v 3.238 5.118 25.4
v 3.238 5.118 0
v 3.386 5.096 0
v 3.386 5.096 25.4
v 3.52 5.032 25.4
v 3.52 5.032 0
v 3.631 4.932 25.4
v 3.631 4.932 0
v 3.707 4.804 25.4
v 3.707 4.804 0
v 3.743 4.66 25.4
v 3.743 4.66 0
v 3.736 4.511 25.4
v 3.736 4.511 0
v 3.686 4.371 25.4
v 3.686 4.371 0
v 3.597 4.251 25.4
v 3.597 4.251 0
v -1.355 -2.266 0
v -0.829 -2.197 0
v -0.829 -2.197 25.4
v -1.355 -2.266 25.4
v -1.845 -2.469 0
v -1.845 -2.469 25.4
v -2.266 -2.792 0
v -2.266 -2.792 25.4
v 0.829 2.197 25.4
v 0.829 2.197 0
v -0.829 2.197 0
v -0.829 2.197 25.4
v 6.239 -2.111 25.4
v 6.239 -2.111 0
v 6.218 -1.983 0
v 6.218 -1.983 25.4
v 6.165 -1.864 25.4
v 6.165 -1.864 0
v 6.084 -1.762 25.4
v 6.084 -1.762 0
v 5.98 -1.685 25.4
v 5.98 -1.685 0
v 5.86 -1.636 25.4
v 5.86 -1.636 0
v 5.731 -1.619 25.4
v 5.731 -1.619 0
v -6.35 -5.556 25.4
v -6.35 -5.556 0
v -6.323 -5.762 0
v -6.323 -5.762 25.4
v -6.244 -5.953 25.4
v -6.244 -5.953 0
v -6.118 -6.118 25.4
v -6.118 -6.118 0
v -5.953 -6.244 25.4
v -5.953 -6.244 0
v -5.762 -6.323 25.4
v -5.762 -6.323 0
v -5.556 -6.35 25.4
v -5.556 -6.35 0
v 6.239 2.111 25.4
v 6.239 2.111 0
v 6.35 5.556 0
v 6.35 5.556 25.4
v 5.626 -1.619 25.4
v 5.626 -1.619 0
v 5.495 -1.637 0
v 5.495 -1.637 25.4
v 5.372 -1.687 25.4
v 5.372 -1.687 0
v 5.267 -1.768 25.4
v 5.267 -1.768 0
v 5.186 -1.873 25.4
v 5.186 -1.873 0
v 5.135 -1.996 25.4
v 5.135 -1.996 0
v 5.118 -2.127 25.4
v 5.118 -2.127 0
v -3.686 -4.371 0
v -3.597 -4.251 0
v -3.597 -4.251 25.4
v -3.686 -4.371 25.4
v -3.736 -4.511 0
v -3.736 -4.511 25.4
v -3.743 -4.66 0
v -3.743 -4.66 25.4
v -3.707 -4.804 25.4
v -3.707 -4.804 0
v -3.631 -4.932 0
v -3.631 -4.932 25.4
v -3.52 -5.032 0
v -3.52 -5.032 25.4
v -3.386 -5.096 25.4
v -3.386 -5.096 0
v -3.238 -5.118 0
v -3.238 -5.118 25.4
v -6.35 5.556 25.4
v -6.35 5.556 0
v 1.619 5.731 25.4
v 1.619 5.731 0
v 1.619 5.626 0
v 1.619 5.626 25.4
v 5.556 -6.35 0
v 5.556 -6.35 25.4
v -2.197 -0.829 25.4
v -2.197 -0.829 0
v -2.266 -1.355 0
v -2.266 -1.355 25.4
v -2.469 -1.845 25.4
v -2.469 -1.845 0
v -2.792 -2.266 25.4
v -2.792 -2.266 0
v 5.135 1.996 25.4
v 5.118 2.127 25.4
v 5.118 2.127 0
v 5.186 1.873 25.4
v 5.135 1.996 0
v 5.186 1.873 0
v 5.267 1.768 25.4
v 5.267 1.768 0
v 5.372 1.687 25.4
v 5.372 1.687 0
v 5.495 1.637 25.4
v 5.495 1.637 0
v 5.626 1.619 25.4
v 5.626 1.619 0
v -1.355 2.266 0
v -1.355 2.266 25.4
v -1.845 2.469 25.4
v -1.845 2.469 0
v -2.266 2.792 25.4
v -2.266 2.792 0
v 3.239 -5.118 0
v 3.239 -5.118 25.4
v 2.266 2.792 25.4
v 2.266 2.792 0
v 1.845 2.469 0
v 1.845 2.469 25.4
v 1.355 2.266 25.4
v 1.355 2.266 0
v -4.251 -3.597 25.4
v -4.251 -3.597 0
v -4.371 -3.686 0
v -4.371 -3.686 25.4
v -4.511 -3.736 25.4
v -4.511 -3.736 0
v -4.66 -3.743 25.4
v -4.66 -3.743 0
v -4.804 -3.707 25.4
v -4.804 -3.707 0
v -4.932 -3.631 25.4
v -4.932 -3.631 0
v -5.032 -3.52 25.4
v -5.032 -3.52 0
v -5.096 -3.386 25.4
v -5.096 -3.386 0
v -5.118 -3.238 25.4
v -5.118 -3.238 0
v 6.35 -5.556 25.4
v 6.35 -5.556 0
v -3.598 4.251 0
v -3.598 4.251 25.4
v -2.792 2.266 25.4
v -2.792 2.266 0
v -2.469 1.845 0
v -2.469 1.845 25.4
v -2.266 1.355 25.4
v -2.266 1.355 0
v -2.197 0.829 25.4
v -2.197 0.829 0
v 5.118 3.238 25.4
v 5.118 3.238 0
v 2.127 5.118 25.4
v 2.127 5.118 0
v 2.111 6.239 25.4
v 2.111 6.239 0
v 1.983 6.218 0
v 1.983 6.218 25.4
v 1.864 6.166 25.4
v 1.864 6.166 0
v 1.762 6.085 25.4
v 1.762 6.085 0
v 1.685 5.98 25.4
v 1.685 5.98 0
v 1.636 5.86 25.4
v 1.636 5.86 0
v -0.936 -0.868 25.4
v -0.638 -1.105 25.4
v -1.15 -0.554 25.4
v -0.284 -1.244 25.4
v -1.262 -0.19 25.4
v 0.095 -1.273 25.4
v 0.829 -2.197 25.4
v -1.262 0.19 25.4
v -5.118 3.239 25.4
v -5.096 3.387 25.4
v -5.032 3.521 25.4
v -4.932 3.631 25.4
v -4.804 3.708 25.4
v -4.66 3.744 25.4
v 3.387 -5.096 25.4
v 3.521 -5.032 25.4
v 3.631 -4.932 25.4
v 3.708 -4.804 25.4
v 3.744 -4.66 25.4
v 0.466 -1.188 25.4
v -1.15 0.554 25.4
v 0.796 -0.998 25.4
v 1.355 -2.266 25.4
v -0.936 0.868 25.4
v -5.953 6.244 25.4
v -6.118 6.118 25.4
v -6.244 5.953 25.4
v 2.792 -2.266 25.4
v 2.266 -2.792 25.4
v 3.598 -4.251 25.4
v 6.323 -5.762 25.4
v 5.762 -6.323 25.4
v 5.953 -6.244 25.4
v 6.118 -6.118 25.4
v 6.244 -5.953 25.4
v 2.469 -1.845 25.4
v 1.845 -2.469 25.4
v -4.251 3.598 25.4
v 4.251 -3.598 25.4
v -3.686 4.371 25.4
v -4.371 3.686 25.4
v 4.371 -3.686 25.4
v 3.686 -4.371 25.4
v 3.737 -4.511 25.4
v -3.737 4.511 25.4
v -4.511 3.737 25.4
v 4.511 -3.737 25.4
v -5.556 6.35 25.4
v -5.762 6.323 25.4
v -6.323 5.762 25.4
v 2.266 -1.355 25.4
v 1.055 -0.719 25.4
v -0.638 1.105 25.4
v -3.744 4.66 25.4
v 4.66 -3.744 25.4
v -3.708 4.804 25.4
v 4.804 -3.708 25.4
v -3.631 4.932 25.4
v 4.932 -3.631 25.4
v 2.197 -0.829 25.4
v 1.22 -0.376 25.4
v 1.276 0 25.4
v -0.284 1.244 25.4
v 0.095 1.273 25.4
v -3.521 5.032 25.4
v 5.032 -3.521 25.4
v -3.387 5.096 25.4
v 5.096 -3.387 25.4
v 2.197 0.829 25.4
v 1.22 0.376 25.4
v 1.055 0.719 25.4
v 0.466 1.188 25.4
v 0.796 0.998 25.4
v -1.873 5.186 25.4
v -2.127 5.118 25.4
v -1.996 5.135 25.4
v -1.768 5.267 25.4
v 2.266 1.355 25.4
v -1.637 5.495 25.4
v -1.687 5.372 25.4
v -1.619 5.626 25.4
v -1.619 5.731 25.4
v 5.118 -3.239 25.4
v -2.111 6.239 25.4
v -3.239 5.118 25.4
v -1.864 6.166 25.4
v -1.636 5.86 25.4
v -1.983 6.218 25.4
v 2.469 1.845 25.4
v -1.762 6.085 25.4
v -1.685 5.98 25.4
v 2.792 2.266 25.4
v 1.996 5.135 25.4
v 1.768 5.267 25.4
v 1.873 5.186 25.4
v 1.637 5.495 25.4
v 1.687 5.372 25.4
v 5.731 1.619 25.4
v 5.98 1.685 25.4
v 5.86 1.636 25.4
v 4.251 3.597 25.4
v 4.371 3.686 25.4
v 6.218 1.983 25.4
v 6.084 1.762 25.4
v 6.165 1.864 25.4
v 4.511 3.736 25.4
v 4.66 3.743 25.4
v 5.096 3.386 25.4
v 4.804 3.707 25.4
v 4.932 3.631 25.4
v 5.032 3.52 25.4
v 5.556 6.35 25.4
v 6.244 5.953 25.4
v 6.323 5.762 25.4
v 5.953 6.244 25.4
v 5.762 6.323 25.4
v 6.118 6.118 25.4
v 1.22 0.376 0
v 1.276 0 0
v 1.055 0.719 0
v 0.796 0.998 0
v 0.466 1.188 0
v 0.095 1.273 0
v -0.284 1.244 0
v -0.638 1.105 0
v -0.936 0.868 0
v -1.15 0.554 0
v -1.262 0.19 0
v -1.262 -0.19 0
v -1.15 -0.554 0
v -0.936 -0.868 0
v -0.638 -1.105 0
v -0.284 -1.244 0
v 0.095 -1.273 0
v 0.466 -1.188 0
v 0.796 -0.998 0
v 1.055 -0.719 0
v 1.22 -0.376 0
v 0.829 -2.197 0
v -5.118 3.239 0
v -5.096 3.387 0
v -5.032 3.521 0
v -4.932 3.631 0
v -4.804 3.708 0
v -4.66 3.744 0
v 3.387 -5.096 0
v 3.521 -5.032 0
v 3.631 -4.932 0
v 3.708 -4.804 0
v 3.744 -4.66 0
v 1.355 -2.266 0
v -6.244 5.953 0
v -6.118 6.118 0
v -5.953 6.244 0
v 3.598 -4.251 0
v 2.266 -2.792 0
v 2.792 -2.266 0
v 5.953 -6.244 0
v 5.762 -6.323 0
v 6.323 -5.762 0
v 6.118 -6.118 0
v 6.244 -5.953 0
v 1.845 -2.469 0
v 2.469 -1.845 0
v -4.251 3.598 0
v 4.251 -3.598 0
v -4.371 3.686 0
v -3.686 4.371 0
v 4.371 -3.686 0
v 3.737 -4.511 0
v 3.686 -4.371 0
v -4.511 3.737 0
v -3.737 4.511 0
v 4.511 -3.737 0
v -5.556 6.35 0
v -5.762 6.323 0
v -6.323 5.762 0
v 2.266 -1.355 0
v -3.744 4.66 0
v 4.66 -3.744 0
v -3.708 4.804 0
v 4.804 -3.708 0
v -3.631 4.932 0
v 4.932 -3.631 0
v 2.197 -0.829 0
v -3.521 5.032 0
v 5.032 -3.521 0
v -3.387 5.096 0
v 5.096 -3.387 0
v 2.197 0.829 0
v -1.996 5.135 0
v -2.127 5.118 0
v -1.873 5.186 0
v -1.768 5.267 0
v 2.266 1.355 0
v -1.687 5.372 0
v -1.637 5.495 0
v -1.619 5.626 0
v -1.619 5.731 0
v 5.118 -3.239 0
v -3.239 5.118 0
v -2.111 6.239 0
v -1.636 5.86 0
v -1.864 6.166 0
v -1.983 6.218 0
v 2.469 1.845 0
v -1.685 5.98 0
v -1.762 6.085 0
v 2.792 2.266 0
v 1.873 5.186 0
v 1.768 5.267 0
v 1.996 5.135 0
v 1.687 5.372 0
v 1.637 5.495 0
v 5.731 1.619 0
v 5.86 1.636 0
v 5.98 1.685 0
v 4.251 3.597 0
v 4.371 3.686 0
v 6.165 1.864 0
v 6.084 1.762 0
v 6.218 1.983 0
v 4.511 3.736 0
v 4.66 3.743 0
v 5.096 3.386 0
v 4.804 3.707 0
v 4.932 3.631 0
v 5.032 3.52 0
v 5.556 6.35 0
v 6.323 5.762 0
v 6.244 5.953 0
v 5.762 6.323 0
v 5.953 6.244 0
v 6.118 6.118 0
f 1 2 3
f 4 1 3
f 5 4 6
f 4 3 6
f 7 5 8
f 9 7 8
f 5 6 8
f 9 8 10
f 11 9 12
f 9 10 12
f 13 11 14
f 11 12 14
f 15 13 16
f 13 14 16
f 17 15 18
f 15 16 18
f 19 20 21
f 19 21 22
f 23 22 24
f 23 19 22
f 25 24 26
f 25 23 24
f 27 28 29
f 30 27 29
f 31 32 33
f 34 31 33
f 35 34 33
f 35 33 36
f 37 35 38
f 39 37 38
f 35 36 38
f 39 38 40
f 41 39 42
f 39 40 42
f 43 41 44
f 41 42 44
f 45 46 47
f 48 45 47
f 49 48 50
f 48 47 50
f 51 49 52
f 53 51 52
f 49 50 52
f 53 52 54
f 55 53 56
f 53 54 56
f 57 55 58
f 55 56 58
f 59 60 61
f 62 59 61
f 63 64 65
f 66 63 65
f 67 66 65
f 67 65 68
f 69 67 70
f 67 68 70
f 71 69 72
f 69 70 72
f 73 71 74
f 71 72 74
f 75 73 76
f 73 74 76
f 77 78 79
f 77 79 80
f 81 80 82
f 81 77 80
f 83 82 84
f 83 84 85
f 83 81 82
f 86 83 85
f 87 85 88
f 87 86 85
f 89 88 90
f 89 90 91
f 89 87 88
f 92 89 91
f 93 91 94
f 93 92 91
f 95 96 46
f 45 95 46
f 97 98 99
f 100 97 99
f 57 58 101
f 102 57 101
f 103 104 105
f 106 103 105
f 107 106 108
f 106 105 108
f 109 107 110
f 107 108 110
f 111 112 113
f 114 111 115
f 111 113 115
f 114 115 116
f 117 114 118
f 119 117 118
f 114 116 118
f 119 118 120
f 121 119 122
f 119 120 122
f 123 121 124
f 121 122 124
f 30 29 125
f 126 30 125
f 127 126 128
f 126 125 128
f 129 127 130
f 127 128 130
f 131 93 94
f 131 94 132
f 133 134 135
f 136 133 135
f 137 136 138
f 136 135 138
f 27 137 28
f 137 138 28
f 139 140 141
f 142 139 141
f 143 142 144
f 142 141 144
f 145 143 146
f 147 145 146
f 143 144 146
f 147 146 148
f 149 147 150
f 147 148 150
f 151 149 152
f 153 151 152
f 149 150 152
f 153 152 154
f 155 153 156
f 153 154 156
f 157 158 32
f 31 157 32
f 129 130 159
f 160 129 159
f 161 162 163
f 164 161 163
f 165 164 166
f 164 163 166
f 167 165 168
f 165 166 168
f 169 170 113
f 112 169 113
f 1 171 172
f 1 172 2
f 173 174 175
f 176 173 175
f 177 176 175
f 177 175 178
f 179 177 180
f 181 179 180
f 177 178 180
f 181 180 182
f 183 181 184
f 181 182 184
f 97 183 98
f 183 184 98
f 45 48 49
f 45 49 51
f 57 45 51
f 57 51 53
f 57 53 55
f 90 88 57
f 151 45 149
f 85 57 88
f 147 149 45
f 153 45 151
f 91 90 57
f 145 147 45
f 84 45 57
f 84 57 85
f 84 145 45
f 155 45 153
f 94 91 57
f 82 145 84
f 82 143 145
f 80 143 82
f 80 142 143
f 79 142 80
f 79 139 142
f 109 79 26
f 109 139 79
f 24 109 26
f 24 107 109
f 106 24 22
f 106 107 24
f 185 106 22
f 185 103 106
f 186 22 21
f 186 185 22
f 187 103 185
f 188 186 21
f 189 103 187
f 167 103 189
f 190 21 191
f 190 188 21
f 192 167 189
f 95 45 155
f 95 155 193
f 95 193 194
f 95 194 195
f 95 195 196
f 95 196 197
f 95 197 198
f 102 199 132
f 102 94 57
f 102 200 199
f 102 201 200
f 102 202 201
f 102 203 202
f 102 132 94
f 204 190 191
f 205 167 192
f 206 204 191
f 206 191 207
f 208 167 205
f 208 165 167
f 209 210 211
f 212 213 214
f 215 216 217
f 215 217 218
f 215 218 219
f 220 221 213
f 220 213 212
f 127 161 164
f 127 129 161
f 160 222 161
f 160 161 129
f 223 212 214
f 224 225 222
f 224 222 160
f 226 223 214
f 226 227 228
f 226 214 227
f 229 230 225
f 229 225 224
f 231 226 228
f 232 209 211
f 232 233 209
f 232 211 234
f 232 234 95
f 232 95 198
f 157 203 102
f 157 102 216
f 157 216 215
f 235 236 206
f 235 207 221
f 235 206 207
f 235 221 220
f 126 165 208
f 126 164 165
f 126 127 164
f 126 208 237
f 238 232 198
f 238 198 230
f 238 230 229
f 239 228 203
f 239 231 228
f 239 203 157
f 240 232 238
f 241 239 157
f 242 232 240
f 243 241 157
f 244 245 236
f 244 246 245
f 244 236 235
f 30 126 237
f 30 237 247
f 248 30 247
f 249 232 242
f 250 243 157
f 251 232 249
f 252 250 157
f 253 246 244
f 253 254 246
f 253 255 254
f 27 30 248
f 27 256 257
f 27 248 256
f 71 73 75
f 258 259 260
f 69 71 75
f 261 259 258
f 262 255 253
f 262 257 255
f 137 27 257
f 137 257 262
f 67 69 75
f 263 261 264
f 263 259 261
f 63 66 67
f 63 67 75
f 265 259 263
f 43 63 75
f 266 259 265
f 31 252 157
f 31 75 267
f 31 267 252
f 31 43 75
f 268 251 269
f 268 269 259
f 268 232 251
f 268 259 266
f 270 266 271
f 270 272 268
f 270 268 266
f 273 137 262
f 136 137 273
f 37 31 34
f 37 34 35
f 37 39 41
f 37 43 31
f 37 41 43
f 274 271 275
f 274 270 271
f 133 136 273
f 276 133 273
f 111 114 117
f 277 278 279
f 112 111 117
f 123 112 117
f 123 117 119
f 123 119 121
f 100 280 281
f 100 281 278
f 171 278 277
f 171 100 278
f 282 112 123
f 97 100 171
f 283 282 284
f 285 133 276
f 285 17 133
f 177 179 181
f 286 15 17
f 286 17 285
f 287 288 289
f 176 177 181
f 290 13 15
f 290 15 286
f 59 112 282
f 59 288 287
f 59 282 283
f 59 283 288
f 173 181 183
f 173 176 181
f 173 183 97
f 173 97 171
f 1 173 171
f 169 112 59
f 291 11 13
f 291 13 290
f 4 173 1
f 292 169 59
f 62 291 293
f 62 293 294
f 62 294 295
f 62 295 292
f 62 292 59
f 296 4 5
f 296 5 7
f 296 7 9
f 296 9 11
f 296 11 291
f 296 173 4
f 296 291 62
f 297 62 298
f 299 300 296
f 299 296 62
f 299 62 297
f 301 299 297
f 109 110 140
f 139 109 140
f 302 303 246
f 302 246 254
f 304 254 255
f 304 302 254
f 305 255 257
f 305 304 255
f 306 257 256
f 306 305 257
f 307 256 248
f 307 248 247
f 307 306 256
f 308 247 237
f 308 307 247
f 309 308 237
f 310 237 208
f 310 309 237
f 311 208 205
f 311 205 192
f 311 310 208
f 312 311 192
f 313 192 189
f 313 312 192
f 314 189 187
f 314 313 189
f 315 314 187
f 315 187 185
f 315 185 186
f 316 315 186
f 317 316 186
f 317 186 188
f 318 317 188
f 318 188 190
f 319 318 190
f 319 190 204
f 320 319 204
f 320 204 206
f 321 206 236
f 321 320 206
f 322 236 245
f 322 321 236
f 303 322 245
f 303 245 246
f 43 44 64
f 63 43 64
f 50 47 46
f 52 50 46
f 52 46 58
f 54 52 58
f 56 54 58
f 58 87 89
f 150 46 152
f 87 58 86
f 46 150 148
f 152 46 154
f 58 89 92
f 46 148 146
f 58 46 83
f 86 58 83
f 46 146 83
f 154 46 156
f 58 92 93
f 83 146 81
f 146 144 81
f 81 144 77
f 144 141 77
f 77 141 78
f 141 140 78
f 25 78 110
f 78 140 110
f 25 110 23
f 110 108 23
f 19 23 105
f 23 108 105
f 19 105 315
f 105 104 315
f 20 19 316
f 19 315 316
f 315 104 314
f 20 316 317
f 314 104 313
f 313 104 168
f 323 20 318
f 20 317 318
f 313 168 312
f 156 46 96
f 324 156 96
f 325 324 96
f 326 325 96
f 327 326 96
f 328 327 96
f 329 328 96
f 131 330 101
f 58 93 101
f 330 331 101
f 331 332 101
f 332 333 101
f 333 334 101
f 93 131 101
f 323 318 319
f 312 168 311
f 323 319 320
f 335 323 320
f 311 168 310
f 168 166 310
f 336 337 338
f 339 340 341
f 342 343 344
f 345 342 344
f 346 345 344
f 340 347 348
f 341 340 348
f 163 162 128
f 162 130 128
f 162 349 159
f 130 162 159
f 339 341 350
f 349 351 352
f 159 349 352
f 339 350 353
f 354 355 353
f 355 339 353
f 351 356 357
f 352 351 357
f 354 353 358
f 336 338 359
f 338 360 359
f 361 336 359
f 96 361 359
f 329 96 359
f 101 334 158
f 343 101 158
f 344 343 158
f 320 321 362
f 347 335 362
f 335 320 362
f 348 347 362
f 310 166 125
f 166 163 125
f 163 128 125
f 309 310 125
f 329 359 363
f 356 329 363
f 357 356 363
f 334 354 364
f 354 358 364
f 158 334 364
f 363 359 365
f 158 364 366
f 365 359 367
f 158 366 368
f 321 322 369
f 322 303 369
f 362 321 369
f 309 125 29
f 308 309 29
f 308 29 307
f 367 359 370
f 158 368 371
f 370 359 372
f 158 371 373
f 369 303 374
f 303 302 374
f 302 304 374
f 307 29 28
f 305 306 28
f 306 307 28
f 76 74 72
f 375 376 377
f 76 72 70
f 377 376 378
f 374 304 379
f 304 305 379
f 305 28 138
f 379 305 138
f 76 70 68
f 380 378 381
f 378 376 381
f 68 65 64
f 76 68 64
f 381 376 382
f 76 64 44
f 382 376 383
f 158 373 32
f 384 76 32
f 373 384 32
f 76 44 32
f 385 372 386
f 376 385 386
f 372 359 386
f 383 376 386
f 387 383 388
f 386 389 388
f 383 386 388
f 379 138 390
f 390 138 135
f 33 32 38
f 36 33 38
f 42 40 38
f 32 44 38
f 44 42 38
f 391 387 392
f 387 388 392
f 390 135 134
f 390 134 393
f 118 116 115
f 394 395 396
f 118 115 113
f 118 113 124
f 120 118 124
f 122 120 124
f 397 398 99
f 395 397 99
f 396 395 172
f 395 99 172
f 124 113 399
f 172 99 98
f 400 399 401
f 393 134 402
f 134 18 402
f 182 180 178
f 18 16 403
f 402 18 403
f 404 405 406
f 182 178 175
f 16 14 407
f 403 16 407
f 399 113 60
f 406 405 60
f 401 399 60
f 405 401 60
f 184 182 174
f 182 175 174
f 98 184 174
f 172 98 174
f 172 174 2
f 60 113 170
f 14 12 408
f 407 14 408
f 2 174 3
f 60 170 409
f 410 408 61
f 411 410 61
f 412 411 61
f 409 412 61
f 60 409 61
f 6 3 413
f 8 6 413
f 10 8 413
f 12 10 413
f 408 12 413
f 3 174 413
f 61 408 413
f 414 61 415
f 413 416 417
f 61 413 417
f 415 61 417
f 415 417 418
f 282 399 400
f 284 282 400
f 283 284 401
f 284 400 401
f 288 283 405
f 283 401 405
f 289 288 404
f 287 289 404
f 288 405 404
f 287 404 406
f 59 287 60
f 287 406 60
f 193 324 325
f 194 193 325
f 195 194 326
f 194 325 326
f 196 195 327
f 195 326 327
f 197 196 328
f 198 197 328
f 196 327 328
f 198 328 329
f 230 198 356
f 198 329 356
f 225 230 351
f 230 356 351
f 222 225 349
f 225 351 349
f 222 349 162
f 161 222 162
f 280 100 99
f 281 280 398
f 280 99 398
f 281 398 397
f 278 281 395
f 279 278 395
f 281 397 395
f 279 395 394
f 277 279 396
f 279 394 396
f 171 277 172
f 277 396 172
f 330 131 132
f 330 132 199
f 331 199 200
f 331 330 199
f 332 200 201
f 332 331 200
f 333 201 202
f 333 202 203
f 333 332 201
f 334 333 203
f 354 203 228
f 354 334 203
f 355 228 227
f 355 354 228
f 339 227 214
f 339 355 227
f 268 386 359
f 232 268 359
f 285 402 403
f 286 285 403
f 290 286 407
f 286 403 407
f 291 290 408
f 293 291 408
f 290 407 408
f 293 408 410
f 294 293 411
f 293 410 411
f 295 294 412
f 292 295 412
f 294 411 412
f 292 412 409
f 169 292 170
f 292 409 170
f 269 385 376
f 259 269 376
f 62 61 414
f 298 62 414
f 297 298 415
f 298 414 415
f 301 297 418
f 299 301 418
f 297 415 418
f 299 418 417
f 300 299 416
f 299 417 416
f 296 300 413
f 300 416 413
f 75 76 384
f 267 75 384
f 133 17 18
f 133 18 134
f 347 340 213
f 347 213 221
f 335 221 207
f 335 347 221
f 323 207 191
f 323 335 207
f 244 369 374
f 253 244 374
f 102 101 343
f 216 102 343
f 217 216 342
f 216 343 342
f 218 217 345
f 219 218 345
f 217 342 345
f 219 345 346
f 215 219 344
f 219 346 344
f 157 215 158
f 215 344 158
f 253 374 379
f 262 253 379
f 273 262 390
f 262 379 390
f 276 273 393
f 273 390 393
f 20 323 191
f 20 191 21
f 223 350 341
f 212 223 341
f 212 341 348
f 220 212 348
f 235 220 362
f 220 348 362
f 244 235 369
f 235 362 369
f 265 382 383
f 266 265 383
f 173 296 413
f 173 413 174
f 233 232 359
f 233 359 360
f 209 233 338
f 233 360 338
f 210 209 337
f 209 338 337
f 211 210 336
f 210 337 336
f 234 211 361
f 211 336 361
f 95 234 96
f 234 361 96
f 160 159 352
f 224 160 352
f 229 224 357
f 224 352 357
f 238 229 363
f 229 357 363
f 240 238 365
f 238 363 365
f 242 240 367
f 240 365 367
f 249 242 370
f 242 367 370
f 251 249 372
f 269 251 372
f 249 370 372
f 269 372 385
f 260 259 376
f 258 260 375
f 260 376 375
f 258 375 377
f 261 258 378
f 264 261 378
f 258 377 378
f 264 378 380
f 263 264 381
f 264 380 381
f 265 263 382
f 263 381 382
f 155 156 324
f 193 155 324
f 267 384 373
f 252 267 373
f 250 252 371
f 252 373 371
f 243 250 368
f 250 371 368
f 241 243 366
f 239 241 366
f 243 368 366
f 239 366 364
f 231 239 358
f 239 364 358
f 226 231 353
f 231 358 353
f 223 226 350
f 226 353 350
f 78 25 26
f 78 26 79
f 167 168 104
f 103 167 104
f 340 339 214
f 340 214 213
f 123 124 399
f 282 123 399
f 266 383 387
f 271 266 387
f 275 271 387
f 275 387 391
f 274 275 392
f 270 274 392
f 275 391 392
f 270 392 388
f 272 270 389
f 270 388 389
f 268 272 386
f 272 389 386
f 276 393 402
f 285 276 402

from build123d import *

# Parameters (mm, degrees)
SKETCH1_R      = 1.27635
EXTRUDE1_DEPTH = 25.4


with BuildPart() as part:
    # Sketch1 → Extrude1 (new body)
    with BuildSketch(Plane.XY):
        with BuildLine():
            Line((-2.266074779, 2.792259021), (-3.597719195, 4.250869712))
            ThreePointArc((-3.597719195, 4.250869712), (-3.707979565, 4.804147382), (-3.239236773, 5.118080056))
            Line((-3.239236773, 5.118080056), (-2.12725, 5.1181))
            ThreePointArc((-2.12725, 5.1181), (-1.768039755, 5.266889755), (-1.61925, 5.6261))
            Line((-1.61925, 5.6261), (-1.61925, 5.731127227))
            ThreePointArc((-1.61925, 5.731127227), (-1.762294622, 6.084500719), (-2.110872134, 6.238864921))
            Line((-2.110872134, 6.238864921), (-5.55625, 6.3499873))
            ThreePointArc((-5.55625, 6.3499873), (-6.117516008, 6.117503308), (-6.35, 5.5562373))
            Line((-6.35, 5.5562373), (-6.35, -5.55625))
            ThreePointArc((-6.35, -5.55625), (-6.117516008, -6.117516008), (-5.55625, -6.35))
            Line((-5.55625, -6.35), (5.55625, -6.35))
            ThreePointArc((5.55625, -6.35), (6.117516008, -6.117516008), (6.35, -5.55625))
            Line((6.35, -5.55625), (6.2388496, -2.110867))
            ThreePointArc((6.2388496, -2.110867), (6.084481448, -1.762300959), (5.73111497, -1.6192627))
            Line((5.73111497, -1.6192627), (5.6261, -1.6192627))
            ThreePointArc((5.6261, -1.6192627), (5.266889755, -1.768052455), (5.1181, -2.1272627))
            Line((5.1181, -2.1272627), (5.118086781, -3.239226147))
            ThreePointArc((5.118086781, -3.239226147), (4.804155079, -3.707969591), (4.250877181, -3.59771037))
            Line((4.250877181, -3.59771037), (2.7922601, -2.2660864))
            ThreePointArc((2.7922601, -2.2660864), (2.351781222, -1.606857234), (2.1971, -0.8292465))
            Line((2.1971, -0.8292465), (2.1971, 0.8292338))
            ThreePointArc((2.1971, 0.8292338), (2.35177885, 1.606851508), (2.792259021, 2.266087479))
            Line((2.792259021, 2.266087479), (4.250877574, 3.596983984))
            ThreePointArc((4.250877574, 3.596983984), (4.804155516, 3.707243364), (5.1180873, 3.238499886))
            Line((5.1180873, 3.238499886), (5.1181, 2.12725))
            ThreePointArc((5.1181, 2.12725), (5.266889755, 1.768039755), (5.6261, 1.61925))
            Line((5.6261, 1.61925), (5.731114527, 1.61925))
            ThreePointArc((5.731114527, 1.61925), (6.084488115, 1.762294714), (6.23885223, 2.1108724))
            Line((6.23885223, 2.1108724), (6.35, 5.55625))
            ThreePointArc((6.35, 5.55625), (6.117516008, 6.117516008), (5.55625, 6.35))
            Line((5.55625, 6.35), (2.110872134, 6.238864921))
            ThreePointArc((2.110872134, 6.238864921), (1.762294622, 6.084500719), (1.61925, 5.731127227))
            Line((1.61925, 5.731127227), (1.61925, 5.6261))
            ThreePointArc((1.61925, 5.6261), (1.768039755, 5.266889755), (2.12725, 5.1181))
            Line((2.12725, 5.1181), (3.238489261, 5.118094023))
            ThreePointArc((3.238489261, 5.118094023), (3.70723339, 4.804163213), (3.596975159, 4.250885042))
            Line((3.596975159, 4.250885042), (2.266081683, 2.792263725))
            ThreePointArc((2.266081683, 2.792263725), (1.606847146, 2.351789743), (0.8292338, 2.1971127))
            Line((0.8292338, 2.1971127), (-0.8292338, 2.1971))
            ThreePointArc((-0.8292338, 2.1971), (-1.606846535, 2.35177679), (-2.266074779, 2.792259021))
        make_face()
        Circle(SKETCH1_R, mode=Mode.SUBTRACT)
        with BuildLine():
            Line((-5.1180873, -3.238499886), (-5.118086781, 3.239226147))
            ThreePointArc((-5.118086781, 3.239226147), (-4.804155079, 3.707969591), (-4.250877181, 3.59771037))
            Line((-4.250877181, 3.59771037), (-2.792246321, 2.266087479))
            ThreePointArc((-2.792246321, 2.266087479), (-2.35176409, 1.606859235), (-2.1970873, 0.8292465))
            Line((-2.1970873, 0.8292465), (-2.1971, -0.8292465))
            ThreePointArc((-2.1971, -0.8292465), (-2.35177679, -1.606859235), (-2.792259021, -2.266087479))
            Line((-2.792259021, -2.266087479), (-4.250877574, -3.596983984))
            ThreePointArc((-4.250877574, -3.596983984), (-4.804155516, -3.707243364), (-5.1180873, -3.238499886))
        make_face(mode=Mode.SUBTRACT)
        with BuildLine():
            Line((0.8292465, -2.1970873), (-0.8292465, -2.1971))
            ThreePointArc((-0.8292465, -2.1971), (-1.606859235, -2.35177679), (-2.266087479, -2.792259021))
            Line((-2.266087479, -2.792259021), (-3.596983984, -4.250877574))
            ThreePointArc((-3.596983984, -4.250877574), (-3.707243364, -4.804155516), (-3.238499886, -5.1180873))
            Line((-3.238499886, -5.1180873), (3.239226147, -5.118086781))
            ThreePointArc((3.239226147, -5.118086781), (3.707969591, -4.804155079), (3.59771037, -4.250877181))
            Line((3.59771037, -4.250877181), (2.266087479, -2.792246321))
            ThreePointArc((2.266087479, -2.792246321), (1.606859235, -2.35176409), (0.8292465, -2.1970873))
        make_face(mode=Mode.SUBTRACT)
    extrude(amount=EXTRUDE1_DEPTH)


solid = part.part
